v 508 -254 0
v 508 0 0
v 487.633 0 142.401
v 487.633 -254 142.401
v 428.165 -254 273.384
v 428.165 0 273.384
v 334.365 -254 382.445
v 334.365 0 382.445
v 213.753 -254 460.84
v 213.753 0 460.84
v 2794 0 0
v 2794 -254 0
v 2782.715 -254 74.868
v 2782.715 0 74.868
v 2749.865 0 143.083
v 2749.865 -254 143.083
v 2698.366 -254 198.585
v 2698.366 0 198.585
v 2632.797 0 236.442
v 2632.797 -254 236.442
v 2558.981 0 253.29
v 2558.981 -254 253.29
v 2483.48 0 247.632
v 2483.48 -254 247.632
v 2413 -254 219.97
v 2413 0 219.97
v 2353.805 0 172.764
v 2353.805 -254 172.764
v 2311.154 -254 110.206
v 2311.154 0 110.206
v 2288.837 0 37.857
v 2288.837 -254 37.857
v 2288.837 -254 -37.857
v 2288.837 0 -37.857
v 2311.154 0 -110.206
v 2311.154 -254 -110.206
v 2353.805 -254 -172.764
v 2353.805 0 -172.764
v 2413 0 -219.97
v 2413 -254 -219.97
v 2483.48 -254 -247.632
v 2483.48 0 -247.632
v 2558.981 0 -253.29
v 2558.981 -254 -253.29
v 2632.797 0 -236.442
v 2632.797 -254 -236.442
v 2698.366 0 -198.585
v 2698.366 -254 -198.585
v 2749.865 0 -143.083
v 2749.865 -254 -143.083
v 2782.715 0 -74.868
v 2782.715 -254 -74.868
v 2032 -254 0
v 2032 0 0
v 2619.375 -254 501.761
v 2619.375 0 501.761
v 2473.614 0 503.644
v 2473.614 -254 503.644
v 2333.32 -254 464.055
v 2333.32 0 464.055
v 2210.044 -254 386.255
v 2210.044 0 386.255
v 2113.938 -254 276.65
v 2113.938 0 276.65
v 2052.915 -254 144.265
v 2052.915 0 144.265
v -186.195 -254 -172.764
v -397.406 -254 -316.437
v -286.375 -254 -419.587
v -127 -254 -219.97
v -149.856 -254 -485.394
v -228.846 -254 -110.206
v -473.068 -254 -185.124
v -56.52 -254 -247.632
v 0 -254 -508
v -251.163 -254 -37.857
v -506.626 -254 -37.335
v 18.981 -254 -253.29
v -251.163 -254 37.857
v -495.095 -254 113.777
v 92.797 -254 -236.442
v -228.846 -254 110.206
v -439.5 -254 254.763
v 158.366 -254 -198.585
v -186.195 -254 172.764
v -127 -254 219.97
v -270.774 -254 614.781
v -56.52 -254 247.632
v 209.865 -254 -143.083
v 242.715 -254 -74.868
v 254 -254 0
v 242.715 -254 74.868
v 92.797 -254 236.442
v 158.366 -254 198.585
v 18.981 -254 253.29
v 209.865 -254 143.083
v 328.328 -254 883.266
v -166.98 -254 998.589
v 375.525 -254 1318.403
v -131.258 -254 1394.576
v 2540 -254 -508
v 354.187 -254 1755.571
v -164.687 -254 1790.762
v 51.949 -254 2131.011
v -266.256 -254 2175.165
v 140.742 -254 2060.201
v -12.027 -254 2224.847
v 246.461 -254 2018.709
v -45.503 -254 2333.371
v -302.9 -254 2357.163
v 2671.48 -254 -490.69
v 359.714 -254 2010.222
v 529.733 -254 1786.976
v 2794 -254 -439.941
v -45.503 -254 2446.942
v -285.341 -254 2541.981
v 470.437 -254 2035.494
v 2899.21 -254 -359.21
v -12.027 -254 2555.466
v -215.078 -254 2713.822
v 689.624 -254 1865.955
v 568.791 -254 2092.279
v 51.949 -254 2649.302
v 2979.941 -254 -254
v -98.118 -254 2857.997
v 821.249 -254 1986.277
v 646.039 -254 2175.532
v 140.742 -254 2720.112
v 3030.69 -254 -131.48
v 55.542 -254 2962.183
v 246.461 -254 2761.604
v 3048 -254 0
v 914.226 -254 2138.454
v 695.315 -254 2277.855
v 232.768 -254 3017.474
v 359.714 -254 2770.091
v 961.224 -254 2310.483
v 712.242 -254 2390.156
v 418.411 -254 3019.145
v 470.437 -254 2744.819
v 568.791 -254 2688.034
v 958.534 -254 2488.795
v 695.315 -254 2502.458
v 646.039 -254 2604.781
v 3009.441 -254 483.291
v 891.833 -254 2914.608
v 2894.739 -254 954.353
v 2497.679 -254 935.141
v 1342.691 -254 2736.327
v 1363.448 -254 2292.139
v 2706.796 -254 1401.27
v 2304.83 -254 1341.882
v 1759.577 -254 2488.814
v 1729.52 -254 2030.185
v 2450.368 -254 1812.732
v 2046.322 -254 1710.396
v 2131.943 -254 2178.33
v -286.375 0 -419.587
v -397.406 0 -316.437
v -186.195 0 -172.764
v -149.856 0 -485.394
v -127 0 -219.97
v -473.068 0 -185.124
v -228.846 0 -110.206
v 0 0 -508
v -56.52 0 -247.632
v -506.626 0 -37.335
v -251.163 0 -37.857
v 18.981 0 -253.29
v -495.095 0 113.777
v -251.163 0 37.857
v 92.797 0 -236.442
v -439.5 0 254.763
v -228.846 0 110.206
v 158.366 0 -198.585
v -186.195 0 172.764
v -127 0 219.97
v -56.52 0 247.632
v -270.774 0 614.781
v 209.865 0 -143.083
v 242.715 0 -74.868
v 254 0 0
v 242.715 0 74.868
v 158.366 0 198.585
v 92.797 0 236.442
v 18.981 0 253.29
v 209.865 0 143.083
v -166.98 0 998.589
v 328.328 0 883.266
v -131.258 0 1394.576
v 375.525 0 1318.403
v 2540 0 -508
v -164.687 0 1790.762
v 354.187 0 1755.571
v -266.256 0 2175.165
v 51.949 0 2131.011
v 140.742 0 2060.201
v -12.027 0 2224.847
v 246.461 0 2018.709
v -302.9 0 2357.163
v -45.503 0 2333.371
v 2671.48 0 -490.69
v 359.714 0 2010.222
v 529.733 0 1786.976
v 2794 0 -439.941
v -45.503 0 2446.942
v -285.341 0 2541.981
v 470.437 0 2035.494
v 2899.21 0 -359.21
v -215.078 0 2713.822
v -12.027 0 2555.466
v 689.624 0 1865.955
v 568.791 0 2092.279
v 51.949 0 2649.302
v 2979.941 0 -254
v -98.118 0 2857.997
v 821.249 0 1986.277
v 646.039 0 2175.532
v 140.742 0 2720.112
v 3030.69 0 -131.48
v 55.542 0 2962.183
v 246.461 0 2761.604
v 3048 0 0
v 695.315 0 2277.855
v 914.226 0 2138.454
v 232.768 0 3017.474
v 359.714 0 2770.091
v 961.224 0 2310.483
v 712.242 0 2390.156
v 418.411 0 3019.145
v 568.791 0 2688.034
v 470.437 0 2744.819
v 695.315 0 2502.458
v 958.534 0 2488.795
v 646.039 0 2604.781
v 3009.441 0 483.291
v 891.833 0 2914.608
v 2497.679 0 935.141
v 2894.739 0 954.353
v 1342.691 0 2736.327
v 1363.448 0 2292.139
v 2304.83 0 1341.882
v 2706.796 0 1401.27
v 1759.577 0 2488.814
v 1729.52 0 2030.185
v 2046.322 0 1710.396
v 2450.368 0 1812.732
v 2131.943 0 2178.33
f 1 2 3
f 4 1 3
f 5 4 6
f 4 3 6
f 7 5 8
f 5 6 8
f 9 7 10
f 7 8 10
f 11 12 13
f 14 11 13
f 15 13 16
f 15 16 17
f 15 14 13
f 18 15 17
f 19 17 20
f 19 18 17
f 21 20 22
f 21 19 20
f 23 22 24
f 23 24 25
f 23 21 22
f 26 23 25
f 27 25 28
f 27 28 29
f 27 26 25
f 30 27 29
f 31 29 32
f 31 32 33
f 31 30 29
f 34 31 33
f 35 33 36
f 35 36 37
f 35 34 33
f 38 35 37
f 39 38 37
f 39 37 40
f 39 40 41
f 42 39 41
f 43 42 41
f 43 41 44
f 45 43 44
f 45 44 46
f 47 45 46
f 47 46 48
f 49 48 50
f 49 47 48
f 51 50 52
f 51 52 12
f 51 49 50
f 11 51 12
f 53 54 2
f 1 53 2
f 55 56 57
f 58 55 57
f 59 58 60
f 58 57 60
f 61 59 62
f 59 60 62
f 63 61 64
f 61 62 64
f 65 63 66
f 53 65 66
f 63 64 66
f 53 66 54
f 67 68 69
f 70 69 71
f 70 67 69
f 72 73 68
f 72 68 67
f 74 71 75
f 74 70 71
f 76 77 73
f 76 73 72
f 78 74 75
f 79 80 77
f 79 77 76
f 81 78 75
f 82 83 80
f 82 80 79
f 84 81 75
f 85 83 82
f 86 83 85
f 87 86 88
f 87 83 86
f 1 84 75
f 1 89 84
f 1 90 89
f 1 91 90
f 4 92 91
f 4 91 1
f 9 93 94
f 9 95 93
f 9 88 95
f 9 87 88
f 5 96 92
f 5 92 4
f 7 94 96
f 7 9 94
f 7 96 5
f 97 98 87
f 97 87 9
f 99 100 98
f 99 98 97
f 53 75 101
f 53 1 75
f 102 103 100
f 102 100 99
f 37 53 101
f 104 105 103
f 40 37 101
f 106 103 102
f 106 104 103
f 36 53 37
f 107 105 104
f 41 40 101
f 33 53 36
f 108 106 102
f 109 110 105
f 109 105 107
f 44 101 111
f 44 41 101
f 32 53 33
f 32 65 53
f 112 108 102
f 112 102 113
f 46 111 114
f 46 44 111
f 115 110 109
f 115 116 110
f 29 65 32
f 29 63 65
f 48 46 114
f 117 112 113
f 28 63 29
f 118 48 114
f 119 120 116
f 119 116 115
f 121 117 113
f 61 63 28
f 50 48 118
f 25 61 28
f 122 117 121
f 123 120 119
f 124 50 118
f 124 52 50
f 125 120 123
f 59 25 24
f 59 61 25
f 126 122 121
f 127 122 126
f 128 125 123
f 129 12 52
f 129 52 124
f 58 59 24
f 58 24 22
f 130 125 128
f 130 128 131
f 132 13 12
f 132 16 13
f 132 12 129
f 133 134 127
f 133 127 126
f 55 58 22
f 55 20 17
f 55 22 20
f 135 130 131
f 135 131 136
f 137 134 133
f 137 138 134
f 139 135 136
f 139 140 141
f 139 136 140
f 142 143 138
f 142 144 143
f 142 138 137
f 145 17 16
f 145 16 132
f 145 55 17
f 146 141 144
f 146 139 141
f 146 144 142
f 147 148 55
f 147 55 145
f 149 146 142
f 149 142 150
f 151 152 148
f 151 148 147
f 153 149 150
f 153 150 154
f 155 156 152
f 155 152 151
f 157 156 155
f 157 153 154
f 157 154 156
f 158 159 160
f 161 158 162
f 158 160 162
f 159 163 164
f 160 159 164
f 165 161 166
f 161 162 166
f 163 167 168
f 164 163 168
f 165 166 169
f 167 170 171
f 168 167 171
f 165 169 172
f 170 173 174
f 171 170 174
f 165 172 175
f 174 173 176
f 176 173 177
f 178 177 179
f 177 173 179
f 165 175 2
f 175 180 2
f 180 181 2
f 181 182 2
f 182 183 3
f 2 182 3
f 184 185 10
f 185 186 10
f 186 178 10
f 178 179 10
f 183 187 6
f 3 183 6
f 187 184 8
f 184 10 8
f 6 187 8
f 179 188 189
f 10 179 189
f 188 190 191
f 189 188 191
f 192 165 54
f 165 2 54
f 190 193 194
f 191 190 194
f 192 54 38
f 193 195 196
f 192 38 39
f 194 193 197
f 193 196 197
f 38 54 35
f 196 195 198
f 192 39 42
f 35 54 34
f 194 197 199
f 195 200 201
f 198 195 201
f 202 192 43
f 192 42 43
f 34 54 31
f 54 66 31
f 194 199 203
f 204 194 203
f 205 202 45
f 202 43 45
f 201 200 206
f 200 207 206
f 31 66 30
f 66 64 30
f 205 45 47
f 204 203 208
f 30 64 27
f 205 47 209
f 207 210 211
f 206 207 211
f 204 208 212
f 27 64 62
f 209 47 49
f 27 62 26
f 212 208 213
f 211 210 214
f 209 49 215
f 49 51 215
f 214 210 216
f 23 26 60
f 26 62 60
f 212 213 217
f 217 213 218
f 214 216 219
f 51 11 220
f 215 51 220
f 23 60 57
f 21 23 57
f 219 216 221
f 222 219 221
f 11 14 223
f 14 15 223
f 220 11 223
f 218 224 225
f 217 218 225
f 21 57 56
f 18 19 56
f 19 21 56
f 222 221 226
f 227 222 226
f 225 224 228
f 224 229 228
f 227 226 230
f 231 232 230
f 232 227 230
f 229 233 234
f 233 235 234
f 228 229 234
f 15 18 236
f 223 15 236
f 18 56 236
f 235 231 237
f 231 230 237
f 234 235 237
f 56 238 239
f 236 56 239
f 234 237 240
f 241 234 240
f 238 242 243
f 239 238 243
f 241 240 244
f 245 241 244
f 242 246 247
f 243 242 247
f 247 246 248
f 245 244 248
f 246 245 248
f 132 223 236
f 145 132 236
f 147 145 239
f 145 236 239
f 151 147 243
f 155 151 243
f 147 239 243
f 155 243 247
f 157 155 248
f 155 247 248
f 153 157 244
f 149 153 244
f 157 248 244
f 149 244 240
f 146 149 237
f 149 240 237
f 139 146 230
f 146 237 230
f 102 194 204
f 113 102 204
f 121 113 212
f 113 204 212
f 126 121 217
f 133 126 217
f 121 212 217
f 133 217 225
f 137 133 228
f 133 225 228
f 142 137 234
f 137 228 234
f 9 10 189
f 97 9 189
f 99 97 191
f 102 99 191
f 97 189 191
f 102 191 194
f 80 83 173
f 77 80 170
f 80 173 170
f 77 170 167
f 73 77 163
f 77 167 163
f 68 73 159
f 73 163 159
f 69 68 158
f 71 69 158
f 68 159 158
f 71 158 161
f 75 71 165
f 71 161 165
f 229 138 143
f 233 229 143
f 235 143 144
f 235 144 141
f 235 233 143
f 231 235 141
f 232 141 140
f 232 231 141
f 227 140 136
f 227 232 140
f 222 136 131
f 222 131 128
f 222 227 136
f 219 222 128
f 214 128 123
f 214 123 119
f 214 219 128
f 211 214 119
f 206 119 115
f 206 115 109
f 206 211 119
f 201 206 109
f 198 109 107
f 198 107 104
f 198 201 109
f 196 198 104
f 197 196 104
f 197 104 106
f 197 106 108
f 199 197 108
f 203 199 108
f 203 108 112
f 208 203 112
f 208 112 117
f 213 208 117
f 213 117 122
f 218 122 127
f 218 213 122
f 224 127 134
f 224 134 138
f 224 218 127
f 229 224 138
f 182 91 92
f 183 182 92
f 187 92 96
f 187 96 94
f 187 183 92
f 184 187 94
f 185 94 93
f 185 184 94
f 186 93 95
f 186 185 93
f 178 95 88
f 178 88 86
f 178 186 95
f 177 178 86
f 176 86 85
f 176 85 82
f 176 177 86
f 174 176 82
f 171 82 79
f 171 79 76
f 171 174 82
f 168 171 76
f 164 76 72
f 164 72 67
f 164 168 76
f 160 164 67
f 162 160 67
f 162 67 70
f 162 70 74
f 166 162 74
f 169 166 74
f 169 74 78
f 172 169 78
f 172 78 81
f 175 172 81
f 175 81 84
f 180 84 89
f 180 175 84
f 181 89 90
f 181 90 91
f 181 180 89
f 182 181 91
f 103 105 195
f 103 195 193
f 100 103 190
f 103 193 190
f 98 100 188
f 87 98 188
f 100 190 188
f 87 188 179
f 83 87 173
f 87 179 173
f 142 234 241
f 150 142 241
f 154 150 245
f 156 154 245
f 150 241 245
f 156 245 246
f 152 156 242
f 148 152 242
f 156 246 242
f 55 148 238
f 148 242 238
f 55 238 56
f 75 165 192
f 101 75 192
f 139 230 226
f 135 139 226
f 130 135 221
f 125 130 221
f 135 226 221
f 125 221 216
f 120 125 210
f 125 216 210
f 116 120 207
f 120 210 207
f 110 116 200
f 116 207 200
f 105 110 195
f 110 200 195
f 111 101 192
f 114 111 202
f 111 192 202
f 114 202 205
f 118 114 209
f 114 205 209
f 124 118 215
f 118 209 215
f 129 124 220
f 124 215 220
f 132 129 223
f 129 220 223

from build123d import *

# Parameters (mm, degrees)
F0_R     = 254
F0_R_2   = 381
F1_DEPTH = 254


with BuildPart() as f1:
    # F0 (on Front) → F1 (new body)
    with BuildSketch(Plane.XZ):
        with BuildLine():
            Line((0, -508), (2540, -508))
            ThreePointArc((2540, -508), (2899.210245, -359.210245), (3048, 0))
            ThreePointArc((3048, 0), (2298.436429, 2001.872619), (418.410773, 3019.144982))
            ThreePointArc((418.410773, 3019.144982), (-161.895545, 2790.207064), (-266.25594, 2175.164869))
            ThreePointArc((-266.25594, 2175.164869), (-140.49364, 1195.804175), (-439.499641, 254.762764))
            ThreePointArc((-439.499641, 254.762764), (-440.161041, -253.618331), (0, -508))
        make_face()
        Circle(F0_R, mode=Mode.SUBTRACT)
        with Locations((2540, 0)):
            Circle(F0_R, mode=Mode.SUBTRACT)
        with BuildLine():
            Line((2032, 0), (508, 0))
            ThreePointArc((508, 0), (428.165091, 273.383713), (213.753328, 460.84001))
            ThreePointArc((213.753328, 460.84001), (360.460141, 1099.90905), (354.187288, 1755.571141))
            ThreePointArc((354.187288, 1755.571141), (821.248596, 1986.277254), (958.533973, 2488.795215))
            ThreePointArc((958.533973, 2488.795215), (2046.322283, 1710.395894), (2619.375, 501.76051))
            ThreePointArc((2619.375, 501.76051), (2210.044321, 386.255421), (2032, 0))
        make_face(mode=Mode.SUBTRACT)
        with Locations((331.241862, 2390.156444)):
            Circle(F0_R_2, mode=Mode.SUBTRACT)
    extrude(amount=F1_DEPTH)


solid = f1.part
